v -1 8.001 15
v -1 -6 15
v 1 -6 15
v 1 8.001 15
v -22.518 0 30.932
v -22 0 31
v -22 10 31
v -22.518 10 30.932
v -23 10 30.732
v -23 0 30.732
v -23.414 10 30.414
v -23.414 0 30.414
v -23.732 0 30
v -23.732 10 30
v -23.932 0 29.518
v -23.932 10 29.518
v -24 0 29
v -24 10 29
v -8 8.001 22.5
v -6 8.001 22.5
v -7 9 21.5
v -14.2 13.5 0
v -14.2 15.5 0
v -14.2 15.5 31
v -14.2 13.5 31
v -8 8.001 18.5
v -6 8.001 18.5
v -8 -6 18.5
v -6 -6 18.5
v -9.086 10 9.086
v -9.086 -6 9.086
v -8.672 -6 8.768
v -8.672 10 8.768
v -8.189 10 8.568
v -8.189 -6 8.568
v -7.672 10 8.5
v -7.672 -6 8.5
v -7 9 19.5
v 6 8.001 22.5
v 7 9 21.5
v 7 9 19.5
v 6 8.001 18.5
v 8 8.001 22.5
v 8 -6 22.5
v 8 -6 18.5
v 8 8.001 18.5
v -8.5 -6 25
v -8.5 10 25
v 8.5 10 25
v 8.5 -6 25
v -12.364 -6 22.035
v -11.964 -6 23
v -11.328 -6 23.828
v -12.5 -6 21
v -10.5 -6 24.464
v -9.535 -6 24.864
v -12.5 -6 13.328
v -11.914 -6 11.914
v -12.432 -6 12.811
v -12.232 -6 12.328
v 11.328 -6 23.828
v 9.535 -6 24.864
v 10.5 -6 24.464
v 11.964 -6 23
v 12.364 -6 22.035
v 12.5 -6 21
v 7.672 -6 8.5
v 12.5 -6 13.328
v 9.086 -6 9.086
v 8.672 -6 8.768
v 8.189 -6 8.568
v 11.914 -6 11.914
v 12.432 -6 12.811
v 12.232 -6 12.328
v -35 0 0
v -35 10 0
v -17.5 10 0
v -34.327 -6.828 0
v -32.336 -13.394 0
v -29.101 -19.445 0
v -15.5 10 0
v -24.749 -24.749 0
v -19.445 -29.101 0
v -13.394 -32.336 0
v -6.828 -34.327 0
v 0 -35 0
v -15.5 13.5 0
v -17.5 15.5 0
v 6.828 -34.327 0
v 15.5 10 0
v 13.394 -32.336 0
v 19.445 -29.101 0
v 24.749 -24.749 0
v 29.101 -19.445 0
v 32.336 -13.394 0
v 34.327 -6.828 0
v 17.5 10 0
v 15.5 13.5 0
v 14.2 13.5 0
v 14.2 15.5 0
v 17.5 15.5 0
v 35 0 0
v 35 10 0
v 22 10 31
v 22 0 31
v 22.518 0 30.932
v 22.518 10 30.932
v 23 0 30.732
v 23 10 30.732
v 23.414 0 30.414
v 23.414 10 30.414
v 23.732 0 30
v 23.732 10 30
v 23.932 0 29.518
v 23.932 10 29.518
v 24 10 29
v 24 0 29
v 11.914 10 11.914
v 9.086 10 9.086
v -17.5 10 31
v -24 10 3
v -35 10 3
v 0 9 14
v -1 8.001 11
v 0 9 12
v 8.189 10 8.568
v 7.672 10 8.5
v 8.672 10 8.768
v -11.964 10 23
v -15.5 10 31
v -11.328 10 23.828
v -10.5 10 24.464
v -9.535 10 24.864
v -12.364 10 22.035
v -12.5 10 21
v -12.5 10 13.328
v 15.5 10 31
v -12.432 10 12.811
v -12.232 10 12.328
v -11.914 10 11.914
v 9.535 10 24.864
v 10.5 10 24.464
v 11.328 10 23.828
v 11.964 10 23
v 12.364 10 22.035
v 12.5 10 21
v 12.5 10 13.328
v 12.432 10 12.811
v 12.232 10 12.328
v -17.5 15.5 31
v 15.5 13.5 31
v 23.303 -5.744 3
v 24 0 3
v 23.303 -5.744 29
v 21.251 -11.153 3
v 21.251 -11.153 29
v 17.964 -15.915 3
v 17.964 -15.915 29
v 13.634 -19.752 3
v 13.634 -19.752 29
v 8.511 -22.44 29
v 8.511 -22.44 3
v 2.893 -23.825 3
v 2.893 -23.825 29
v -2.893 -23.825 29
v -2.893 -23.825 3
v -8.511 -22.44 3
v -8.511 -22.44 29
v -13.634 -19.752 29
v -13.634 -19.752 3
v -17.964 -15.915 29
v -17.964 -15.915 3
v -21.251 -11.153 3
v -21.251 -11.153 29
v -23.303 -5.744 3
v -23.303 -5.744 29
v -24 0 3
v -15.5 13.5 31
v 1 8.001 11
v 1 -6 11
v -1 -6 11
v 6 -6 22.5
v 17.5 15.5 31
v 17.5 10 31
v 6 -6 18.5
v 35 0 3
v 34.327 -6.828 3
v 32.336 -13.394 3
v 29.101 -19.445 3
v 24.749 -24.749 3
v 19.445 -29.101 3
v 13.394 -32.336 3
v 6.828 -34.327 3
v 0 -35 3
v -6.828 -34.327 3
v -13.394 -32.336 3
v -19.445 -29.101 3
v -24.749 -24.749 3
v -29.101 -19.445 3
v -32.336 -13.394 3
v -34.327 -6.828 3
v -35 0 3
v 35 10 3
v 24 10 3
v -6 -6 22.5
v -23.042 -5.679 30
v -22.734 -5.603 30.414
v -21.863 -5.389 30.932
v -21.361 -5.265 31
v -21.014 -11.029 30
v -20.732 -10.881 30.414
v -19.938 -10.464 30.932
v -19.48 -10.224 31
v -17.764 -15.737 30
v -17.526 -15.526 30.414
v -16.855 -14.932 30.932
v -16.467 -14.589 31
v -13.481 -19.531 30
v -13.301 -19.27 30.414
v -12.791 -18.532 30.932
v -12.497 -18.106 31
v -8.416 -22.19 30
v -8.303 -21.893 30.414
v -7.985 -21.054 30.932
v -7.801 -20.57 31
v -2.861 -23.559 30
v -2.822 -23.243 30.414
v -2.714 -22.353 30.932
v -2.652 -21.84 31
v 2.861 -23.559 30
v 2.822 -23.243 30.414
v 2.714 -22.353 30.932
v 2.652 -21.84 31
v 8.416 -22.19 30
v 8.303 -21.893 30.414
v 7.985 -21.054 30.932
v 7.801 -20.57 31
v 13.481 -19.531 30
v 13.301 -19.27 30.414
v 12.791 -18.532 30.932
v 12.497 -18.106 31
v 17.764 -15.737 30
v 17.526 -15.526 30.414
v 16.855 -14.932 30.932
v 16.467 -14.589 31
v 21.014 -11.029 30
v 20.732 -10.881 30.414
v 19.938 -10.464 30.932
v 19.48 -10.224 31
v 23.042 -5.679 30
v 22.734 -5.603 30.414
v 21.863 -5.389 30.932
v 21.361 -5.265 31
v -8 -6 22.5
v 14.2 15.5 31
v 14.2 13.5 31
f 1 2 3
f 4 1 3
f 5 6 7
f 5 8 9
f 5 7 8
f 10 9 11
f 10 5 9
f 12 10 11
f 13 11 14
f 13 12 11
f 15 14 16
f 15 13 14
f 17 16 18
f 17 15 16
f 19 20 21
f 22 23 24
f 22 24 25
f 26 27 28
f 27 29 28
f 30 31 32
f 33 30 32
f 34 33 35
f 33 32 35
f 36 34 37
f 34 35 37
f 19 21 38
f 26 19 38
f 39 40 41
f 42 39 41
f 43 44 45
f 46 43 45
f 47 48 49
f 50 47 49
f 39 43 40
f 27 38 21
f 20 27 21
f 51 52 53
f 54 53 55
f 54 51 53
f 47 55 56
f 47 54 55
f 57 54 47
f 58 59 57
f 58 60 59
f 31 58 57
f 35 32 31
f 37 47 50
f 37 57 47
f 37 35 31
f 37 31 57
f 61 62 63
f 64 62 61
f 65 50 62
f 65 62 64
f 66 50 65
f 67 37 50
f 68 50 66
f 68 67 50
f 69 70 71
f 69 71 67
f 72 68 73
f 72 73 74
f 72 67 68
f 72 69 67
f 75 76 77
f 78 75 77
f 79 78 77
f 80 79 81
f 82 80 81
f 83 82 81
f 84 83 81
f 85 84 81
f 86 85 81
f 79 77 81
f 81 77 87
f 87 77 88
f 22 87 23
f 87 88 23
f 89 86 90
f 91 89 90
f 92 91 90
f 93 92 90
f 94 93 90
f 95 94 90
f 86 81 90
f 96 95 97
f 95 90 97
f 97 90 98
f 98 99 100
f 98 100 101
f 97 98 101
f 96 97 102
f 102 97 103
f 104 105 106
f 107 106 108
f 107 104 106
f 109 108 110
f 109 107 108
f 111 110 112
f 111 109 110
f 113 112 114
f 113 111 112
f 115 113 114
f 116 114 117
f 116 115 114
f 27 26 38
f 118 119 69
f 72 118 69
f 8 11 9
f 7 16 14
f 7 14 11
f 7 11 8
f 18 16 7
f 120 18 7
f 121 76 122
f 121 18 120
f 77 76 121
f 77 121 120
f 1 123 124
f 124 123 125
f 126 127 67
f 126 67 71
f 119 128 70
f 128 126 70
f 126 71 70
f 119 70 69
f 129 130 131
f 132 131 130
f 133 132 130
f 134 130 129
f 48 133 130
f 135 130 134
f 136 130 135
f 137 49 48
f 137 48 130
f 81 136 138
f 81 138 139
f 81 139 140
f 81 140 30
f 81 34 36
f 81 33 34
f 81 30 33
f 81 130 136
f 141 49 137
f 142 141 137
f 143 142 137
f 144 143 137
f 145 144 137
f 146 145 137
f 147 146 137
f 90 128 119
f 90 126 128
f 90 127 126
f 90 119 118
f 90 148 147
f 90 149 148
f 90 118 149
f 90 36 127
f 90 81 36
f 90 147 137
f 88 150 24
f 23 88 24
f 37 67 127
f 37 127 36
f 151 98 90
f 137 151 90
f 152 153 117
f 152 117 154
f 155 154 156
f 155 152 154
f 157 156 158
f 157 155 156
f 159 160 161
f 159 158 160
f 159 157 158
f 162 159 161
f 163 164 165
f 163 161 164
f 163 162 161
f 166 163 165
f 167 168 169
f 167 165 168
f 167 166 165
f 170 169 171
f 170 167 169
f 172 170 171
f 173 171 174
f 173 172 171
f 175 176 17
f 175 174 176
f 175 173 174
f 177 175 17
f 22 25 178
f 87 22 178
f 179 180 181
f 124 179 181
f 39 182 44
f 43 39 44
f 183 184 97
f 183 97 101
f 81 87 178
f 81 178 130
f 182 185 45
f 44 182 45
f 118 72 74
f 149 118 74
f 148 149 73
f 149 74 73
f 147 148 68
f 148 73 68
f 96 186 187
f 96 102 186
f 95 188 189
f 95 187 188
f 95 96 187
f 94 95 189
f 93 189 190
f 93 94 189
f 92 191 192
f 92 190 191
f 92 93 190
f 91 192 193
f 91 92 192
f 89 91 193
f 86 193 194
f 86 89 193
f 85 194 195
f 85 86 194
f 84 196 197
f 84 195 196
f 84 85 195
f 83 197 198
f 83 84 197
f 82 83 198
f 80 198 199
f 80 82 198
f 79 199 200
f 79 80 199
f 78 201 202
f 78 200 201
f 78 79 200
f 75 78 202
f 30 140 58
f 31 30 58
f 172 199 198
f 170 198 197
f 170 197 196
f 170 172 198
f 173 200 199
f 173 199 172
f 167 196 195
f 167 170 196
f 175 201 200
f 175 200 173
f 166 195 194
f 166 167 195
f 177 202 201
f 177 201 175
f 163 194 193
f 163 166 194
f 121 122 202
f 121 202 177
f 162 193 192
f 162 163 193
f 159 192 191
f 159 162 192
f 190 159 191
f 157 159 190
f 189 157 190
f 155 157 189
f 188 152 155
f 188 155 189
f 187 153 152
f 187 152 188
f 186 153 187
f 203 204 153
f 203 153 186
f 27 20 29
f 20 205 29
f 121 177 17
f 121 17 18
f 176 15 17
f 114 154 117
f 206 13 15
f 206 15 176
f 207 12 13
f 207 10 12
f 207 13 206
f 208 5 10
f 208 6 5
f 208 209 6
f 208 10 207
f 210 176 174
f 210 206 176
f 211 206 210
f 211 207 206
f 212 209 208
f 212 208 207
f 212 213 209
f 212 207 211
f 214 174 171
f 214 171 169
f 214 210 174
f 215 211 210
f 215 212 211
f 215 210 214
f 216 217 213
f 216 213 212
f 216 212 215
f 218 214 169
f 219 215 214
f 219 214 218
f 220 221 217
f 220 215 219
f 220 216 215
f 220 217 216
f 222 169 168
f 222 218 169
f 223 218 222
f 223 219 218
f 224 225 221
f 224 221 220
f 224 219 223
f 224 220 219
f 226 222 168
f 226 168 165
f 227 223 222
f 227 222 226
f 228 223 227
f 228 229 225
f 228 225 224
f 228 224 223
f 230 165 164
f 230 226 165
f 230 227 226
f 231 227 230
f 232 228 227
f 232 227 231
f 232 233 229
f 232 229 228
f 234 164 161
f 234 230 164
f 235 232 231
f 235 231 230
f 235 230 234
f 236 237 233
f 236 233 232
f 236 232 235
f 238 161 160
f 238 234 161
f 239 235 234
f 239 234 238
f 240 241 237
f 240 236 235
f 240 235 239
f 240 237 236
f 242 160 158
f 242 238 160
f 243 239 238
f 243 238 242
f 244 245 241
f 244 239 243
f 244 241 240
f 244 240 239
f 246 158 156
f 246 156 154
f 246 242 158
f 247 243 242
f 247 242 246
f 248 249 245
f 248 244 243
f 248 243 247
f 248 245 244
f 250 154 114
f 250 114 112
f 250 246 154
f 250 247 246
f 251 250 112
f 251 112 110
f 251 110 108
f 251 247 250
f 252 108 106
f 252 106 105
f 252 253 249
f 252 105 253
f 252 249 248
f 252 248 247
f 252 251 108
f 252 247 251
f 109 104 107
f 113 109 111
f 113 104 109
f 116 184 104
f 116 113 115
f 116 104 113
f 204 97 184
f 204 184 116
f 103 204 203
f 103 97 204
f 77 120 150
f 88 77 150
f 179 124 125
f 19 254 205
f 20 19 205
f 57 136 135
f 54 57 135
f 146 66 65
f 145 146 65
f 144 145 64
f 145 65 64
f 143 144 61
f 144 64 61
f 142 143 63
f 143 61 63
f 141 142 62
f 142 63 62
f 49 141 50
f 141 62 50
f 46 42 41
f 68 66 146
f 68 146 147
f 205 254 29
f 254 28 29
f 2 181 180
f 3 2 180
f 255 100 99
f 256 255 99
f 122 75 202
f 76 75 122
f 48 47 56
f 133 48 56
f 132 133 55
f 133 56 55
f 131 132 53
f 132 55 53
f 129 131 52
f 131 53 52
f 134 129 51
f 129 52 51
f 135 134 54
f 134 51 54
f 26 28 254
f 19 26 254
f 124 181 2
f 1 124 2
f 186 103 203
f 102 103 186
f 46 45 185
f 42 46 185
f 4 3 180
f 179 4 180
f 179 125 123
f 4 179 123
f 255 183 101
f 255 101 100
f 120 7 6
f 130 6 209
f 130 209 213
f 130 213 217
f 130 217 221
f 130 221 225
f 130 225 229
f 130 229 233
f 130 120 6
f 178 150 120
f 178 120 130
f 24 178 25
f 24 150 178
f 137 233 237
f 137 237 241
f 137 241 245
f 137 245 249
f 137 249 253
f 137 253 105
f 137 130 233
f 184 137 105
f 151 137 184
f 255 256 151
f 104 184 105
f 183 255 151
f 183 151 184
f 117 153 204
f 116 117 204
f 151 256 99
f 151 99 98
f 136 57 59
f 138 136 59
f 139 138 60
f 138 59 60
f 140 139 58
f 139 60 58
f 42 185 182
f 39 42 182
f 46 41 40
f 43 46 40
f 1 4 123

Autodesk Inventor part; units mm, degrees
ref_plane "YZ Plane" through (0, 0, 0) normal (1, 0, 0) x (0, 1, 0)
ref_plane "XZ Plane" through (0, 0, 0) normal (0, 1, 0) x (-1, 0, 0)
ref_plane "XY Plane" through (0, 0, 0) normal (0, 0, 1) x (1, 0, 0)
sketch "Esquisse1" plane through (0, 0, 0) normal (0, 0, 1) x (1, 0, 0)
  arc A0 (-35, 0) -> (35, 0) centre (0, 0) ccw
  line L0 (-35, 0) -> (-35, 10)
  line L1 (-35, 10) -> (35, 10)
  line L2 (35, 10) -> (35, 0)
  dimension "d0" = 70
  dimension "d1" = 10
extrude "Extrusion1" add sketch "Esquisse1" along normal blind 3
sketch "Esquisse2" plane through (0, 0, 3) normal (0, 0, 1) x (1, 0, 0)
  arc A0 (-24, 0) -> (24, 0) centre (0, 0) ccw
  line L0 (35, 10) -> (-35, 10) projected
  line L1 (-33.1295, -24) -> (42.942, -24) construction
  line L2 (-24, 0) -> (-24, 10)
  line L3 (24, 0) -> (24, 10)
  line L4 (-24, 10) -> (24, 10)
  dimension "d5" = 34
extrude "Extrusion2" add sketch "Esquisse2" along normal blind 28
fillet "Congé1" radius 2 3 edges at (0, -24, 31) (-24, 5, 31) (24, 5, 31)
sketch "Esquisse3" plane through (0, 0, 31) normal (0, 0, 1) x (1, 0, 0)
  line L0 (-17.5, 10) -> (-17.5, 15.5)
  line L1 (-17.5, 15.5) -> (-14.2, 15.5)
  line L2 (-14.2, 15.5) -> (-14.2, 13.5)
  line L3 (-14.2, 13.5) -> (-15.5, 13.5)
  line L4 (-15.5, 13.5) -> (-15.5, 10)
  line L5 (-15.5, 10) -> (-17.5, 10)
  line L6 (22, 10) -> (-22, 10) projected
  line L7 (0, -45.6195) -> (0, 28.7169) construction
  line L8 (17.5, 10) -> (17.5, 15.5)
  line L9 (17.5, 15.5) -> (14.2, 15.5)
  line L10 (14.2, 15.5) -> (14.2, 13.5)
  line L11 (14.2, 13.5) -> (15.5, 13.5)
  line L12 (15.5, 13.5) -> (15.5, 10)
  line L13 (15.5, 10) -> (17.5, 10)
  point P0 (0, 0)
  dimension "d9" = 35
  dimension "d10" = 31
  dimension "d11" = 2
  dimension "d12" = 5.5
  dimension "d13" = 3.3
extrude "Extrusion3" add sketch "Esquisse3" against normal up to surface (31 mm away)
sketch "Esquisse4" plane through (-15.5, 10, 0) normal (0, 1, 0) x (1, 0, 0)
  line L0 (28, -8.5) -> (3, -8.5)
  line L1 (3, -8.5) -> (3, -25)
  line L2 (3, -25) -> (28, -25)
  line L3 (28, -25) -> (28, -8.5)
  line L4 (31, 0) -> (0, 0) projected
  line L5 (31, -31) -> (0, -31) projected
  point P0 (15.5, 0)
  point P1 (15.5, -8.5)
  point P2 (15.5, 0)
  dimension "d16" = 25
  dimension "d17" = 16.5
  dimension "d18" = 6
extrude "Extrusion4" cut sketch "Esquisse4" against normal blind 16
chamfer "Chanfrein1" distance 4 angle 45 2 edges at (12.5, 2, 8.5) (-12.5, 2, 8.5)
fillet "Congé3" radius 4 2 edges at (-12.5, 2, 25) (12.5, 2, 25)
fillet "Congé3" radius 2 4 edges at (8.5, 2, 8.5) (12.5, 2, 12.5) (-8.5, 2, 8.5) (-12.5, 2, 12.5)
sketch "Esquisse5" plane through (-15.5, -6, 0) normal (0, 1, 0) x (1, 0, 0)
  line L0 (23.5, -18.5) -> (21.5, -18.5)
  line L1 (21.5, -18.5) -> (21.5, -22.5)
  line L2 (21.5, -22.5) -> (23.5, -22.5)
  line L3 (23.5, -22.5) -> (23.5, -18.5)
  line L4 (9.5, -18.5) -> (7.5, -18.5)
  line L5 (7.5, -18.5) -> (7.5, -22.5)
  line L6 (7.5, -22.5) -> (9.5, -22.5)
  line L7 (9.5, -22.5) -> (9.5, -18.5)
  line L8 (16.5, -11) -> (14.5, -11)
  line L9 (14.5, -11) -> (14.5, -15)
  line L10 (14.5, -15) -> (16.5, -15)
  line L11 (16.5, -15) -> (16.5, -11)
  line L12 (7.8284, -8.5) -> (23.1716, -8.5) projected
  line L13 (24, -25) -> (7, -25) projected
  point P0 (15.5, 0)
  point P1 (15.5, -11)
  dimension "d27" = 2
  dimension "d28" = 2
  dimension "d29" = 2
  dimension "d30" = 12
  dimension "d31" = 6
  dimension "d32" = 4
  dimension "d33" = 4
  dimension "d34" = 2.5
  dimension "d35" = 2.5
extrude "Extrusion5" add sketch "Esquisse5" along normal blind 15 separate body
chamfer "Chanfrein2" distance 1 angle 45 12 edges at (6, 9, 20.5) (7, 9, 22.5) (8, 9, 20.5) (7, 9, 18.5) (-1, 9, 13) (0, 9, 15) (1, 9, 13) (0, 9, 11) (-7, 9, 18.5) (-6, 9, 20.5) (-7, 9, 22.5) (-8, 9, 20.5)
equation "\"d28\" = d27"
equation "\"d29\" = d27"
equation "\"d31\" = 0.5 * d30"
equation "\"d33\" = d32"
equation "\"d35\" = d34"
equation "\"nombredor\" = 1.61803"
equation "\"pi\" = 3.141593"
properties part number "Prise" material "Plastique ABS"
